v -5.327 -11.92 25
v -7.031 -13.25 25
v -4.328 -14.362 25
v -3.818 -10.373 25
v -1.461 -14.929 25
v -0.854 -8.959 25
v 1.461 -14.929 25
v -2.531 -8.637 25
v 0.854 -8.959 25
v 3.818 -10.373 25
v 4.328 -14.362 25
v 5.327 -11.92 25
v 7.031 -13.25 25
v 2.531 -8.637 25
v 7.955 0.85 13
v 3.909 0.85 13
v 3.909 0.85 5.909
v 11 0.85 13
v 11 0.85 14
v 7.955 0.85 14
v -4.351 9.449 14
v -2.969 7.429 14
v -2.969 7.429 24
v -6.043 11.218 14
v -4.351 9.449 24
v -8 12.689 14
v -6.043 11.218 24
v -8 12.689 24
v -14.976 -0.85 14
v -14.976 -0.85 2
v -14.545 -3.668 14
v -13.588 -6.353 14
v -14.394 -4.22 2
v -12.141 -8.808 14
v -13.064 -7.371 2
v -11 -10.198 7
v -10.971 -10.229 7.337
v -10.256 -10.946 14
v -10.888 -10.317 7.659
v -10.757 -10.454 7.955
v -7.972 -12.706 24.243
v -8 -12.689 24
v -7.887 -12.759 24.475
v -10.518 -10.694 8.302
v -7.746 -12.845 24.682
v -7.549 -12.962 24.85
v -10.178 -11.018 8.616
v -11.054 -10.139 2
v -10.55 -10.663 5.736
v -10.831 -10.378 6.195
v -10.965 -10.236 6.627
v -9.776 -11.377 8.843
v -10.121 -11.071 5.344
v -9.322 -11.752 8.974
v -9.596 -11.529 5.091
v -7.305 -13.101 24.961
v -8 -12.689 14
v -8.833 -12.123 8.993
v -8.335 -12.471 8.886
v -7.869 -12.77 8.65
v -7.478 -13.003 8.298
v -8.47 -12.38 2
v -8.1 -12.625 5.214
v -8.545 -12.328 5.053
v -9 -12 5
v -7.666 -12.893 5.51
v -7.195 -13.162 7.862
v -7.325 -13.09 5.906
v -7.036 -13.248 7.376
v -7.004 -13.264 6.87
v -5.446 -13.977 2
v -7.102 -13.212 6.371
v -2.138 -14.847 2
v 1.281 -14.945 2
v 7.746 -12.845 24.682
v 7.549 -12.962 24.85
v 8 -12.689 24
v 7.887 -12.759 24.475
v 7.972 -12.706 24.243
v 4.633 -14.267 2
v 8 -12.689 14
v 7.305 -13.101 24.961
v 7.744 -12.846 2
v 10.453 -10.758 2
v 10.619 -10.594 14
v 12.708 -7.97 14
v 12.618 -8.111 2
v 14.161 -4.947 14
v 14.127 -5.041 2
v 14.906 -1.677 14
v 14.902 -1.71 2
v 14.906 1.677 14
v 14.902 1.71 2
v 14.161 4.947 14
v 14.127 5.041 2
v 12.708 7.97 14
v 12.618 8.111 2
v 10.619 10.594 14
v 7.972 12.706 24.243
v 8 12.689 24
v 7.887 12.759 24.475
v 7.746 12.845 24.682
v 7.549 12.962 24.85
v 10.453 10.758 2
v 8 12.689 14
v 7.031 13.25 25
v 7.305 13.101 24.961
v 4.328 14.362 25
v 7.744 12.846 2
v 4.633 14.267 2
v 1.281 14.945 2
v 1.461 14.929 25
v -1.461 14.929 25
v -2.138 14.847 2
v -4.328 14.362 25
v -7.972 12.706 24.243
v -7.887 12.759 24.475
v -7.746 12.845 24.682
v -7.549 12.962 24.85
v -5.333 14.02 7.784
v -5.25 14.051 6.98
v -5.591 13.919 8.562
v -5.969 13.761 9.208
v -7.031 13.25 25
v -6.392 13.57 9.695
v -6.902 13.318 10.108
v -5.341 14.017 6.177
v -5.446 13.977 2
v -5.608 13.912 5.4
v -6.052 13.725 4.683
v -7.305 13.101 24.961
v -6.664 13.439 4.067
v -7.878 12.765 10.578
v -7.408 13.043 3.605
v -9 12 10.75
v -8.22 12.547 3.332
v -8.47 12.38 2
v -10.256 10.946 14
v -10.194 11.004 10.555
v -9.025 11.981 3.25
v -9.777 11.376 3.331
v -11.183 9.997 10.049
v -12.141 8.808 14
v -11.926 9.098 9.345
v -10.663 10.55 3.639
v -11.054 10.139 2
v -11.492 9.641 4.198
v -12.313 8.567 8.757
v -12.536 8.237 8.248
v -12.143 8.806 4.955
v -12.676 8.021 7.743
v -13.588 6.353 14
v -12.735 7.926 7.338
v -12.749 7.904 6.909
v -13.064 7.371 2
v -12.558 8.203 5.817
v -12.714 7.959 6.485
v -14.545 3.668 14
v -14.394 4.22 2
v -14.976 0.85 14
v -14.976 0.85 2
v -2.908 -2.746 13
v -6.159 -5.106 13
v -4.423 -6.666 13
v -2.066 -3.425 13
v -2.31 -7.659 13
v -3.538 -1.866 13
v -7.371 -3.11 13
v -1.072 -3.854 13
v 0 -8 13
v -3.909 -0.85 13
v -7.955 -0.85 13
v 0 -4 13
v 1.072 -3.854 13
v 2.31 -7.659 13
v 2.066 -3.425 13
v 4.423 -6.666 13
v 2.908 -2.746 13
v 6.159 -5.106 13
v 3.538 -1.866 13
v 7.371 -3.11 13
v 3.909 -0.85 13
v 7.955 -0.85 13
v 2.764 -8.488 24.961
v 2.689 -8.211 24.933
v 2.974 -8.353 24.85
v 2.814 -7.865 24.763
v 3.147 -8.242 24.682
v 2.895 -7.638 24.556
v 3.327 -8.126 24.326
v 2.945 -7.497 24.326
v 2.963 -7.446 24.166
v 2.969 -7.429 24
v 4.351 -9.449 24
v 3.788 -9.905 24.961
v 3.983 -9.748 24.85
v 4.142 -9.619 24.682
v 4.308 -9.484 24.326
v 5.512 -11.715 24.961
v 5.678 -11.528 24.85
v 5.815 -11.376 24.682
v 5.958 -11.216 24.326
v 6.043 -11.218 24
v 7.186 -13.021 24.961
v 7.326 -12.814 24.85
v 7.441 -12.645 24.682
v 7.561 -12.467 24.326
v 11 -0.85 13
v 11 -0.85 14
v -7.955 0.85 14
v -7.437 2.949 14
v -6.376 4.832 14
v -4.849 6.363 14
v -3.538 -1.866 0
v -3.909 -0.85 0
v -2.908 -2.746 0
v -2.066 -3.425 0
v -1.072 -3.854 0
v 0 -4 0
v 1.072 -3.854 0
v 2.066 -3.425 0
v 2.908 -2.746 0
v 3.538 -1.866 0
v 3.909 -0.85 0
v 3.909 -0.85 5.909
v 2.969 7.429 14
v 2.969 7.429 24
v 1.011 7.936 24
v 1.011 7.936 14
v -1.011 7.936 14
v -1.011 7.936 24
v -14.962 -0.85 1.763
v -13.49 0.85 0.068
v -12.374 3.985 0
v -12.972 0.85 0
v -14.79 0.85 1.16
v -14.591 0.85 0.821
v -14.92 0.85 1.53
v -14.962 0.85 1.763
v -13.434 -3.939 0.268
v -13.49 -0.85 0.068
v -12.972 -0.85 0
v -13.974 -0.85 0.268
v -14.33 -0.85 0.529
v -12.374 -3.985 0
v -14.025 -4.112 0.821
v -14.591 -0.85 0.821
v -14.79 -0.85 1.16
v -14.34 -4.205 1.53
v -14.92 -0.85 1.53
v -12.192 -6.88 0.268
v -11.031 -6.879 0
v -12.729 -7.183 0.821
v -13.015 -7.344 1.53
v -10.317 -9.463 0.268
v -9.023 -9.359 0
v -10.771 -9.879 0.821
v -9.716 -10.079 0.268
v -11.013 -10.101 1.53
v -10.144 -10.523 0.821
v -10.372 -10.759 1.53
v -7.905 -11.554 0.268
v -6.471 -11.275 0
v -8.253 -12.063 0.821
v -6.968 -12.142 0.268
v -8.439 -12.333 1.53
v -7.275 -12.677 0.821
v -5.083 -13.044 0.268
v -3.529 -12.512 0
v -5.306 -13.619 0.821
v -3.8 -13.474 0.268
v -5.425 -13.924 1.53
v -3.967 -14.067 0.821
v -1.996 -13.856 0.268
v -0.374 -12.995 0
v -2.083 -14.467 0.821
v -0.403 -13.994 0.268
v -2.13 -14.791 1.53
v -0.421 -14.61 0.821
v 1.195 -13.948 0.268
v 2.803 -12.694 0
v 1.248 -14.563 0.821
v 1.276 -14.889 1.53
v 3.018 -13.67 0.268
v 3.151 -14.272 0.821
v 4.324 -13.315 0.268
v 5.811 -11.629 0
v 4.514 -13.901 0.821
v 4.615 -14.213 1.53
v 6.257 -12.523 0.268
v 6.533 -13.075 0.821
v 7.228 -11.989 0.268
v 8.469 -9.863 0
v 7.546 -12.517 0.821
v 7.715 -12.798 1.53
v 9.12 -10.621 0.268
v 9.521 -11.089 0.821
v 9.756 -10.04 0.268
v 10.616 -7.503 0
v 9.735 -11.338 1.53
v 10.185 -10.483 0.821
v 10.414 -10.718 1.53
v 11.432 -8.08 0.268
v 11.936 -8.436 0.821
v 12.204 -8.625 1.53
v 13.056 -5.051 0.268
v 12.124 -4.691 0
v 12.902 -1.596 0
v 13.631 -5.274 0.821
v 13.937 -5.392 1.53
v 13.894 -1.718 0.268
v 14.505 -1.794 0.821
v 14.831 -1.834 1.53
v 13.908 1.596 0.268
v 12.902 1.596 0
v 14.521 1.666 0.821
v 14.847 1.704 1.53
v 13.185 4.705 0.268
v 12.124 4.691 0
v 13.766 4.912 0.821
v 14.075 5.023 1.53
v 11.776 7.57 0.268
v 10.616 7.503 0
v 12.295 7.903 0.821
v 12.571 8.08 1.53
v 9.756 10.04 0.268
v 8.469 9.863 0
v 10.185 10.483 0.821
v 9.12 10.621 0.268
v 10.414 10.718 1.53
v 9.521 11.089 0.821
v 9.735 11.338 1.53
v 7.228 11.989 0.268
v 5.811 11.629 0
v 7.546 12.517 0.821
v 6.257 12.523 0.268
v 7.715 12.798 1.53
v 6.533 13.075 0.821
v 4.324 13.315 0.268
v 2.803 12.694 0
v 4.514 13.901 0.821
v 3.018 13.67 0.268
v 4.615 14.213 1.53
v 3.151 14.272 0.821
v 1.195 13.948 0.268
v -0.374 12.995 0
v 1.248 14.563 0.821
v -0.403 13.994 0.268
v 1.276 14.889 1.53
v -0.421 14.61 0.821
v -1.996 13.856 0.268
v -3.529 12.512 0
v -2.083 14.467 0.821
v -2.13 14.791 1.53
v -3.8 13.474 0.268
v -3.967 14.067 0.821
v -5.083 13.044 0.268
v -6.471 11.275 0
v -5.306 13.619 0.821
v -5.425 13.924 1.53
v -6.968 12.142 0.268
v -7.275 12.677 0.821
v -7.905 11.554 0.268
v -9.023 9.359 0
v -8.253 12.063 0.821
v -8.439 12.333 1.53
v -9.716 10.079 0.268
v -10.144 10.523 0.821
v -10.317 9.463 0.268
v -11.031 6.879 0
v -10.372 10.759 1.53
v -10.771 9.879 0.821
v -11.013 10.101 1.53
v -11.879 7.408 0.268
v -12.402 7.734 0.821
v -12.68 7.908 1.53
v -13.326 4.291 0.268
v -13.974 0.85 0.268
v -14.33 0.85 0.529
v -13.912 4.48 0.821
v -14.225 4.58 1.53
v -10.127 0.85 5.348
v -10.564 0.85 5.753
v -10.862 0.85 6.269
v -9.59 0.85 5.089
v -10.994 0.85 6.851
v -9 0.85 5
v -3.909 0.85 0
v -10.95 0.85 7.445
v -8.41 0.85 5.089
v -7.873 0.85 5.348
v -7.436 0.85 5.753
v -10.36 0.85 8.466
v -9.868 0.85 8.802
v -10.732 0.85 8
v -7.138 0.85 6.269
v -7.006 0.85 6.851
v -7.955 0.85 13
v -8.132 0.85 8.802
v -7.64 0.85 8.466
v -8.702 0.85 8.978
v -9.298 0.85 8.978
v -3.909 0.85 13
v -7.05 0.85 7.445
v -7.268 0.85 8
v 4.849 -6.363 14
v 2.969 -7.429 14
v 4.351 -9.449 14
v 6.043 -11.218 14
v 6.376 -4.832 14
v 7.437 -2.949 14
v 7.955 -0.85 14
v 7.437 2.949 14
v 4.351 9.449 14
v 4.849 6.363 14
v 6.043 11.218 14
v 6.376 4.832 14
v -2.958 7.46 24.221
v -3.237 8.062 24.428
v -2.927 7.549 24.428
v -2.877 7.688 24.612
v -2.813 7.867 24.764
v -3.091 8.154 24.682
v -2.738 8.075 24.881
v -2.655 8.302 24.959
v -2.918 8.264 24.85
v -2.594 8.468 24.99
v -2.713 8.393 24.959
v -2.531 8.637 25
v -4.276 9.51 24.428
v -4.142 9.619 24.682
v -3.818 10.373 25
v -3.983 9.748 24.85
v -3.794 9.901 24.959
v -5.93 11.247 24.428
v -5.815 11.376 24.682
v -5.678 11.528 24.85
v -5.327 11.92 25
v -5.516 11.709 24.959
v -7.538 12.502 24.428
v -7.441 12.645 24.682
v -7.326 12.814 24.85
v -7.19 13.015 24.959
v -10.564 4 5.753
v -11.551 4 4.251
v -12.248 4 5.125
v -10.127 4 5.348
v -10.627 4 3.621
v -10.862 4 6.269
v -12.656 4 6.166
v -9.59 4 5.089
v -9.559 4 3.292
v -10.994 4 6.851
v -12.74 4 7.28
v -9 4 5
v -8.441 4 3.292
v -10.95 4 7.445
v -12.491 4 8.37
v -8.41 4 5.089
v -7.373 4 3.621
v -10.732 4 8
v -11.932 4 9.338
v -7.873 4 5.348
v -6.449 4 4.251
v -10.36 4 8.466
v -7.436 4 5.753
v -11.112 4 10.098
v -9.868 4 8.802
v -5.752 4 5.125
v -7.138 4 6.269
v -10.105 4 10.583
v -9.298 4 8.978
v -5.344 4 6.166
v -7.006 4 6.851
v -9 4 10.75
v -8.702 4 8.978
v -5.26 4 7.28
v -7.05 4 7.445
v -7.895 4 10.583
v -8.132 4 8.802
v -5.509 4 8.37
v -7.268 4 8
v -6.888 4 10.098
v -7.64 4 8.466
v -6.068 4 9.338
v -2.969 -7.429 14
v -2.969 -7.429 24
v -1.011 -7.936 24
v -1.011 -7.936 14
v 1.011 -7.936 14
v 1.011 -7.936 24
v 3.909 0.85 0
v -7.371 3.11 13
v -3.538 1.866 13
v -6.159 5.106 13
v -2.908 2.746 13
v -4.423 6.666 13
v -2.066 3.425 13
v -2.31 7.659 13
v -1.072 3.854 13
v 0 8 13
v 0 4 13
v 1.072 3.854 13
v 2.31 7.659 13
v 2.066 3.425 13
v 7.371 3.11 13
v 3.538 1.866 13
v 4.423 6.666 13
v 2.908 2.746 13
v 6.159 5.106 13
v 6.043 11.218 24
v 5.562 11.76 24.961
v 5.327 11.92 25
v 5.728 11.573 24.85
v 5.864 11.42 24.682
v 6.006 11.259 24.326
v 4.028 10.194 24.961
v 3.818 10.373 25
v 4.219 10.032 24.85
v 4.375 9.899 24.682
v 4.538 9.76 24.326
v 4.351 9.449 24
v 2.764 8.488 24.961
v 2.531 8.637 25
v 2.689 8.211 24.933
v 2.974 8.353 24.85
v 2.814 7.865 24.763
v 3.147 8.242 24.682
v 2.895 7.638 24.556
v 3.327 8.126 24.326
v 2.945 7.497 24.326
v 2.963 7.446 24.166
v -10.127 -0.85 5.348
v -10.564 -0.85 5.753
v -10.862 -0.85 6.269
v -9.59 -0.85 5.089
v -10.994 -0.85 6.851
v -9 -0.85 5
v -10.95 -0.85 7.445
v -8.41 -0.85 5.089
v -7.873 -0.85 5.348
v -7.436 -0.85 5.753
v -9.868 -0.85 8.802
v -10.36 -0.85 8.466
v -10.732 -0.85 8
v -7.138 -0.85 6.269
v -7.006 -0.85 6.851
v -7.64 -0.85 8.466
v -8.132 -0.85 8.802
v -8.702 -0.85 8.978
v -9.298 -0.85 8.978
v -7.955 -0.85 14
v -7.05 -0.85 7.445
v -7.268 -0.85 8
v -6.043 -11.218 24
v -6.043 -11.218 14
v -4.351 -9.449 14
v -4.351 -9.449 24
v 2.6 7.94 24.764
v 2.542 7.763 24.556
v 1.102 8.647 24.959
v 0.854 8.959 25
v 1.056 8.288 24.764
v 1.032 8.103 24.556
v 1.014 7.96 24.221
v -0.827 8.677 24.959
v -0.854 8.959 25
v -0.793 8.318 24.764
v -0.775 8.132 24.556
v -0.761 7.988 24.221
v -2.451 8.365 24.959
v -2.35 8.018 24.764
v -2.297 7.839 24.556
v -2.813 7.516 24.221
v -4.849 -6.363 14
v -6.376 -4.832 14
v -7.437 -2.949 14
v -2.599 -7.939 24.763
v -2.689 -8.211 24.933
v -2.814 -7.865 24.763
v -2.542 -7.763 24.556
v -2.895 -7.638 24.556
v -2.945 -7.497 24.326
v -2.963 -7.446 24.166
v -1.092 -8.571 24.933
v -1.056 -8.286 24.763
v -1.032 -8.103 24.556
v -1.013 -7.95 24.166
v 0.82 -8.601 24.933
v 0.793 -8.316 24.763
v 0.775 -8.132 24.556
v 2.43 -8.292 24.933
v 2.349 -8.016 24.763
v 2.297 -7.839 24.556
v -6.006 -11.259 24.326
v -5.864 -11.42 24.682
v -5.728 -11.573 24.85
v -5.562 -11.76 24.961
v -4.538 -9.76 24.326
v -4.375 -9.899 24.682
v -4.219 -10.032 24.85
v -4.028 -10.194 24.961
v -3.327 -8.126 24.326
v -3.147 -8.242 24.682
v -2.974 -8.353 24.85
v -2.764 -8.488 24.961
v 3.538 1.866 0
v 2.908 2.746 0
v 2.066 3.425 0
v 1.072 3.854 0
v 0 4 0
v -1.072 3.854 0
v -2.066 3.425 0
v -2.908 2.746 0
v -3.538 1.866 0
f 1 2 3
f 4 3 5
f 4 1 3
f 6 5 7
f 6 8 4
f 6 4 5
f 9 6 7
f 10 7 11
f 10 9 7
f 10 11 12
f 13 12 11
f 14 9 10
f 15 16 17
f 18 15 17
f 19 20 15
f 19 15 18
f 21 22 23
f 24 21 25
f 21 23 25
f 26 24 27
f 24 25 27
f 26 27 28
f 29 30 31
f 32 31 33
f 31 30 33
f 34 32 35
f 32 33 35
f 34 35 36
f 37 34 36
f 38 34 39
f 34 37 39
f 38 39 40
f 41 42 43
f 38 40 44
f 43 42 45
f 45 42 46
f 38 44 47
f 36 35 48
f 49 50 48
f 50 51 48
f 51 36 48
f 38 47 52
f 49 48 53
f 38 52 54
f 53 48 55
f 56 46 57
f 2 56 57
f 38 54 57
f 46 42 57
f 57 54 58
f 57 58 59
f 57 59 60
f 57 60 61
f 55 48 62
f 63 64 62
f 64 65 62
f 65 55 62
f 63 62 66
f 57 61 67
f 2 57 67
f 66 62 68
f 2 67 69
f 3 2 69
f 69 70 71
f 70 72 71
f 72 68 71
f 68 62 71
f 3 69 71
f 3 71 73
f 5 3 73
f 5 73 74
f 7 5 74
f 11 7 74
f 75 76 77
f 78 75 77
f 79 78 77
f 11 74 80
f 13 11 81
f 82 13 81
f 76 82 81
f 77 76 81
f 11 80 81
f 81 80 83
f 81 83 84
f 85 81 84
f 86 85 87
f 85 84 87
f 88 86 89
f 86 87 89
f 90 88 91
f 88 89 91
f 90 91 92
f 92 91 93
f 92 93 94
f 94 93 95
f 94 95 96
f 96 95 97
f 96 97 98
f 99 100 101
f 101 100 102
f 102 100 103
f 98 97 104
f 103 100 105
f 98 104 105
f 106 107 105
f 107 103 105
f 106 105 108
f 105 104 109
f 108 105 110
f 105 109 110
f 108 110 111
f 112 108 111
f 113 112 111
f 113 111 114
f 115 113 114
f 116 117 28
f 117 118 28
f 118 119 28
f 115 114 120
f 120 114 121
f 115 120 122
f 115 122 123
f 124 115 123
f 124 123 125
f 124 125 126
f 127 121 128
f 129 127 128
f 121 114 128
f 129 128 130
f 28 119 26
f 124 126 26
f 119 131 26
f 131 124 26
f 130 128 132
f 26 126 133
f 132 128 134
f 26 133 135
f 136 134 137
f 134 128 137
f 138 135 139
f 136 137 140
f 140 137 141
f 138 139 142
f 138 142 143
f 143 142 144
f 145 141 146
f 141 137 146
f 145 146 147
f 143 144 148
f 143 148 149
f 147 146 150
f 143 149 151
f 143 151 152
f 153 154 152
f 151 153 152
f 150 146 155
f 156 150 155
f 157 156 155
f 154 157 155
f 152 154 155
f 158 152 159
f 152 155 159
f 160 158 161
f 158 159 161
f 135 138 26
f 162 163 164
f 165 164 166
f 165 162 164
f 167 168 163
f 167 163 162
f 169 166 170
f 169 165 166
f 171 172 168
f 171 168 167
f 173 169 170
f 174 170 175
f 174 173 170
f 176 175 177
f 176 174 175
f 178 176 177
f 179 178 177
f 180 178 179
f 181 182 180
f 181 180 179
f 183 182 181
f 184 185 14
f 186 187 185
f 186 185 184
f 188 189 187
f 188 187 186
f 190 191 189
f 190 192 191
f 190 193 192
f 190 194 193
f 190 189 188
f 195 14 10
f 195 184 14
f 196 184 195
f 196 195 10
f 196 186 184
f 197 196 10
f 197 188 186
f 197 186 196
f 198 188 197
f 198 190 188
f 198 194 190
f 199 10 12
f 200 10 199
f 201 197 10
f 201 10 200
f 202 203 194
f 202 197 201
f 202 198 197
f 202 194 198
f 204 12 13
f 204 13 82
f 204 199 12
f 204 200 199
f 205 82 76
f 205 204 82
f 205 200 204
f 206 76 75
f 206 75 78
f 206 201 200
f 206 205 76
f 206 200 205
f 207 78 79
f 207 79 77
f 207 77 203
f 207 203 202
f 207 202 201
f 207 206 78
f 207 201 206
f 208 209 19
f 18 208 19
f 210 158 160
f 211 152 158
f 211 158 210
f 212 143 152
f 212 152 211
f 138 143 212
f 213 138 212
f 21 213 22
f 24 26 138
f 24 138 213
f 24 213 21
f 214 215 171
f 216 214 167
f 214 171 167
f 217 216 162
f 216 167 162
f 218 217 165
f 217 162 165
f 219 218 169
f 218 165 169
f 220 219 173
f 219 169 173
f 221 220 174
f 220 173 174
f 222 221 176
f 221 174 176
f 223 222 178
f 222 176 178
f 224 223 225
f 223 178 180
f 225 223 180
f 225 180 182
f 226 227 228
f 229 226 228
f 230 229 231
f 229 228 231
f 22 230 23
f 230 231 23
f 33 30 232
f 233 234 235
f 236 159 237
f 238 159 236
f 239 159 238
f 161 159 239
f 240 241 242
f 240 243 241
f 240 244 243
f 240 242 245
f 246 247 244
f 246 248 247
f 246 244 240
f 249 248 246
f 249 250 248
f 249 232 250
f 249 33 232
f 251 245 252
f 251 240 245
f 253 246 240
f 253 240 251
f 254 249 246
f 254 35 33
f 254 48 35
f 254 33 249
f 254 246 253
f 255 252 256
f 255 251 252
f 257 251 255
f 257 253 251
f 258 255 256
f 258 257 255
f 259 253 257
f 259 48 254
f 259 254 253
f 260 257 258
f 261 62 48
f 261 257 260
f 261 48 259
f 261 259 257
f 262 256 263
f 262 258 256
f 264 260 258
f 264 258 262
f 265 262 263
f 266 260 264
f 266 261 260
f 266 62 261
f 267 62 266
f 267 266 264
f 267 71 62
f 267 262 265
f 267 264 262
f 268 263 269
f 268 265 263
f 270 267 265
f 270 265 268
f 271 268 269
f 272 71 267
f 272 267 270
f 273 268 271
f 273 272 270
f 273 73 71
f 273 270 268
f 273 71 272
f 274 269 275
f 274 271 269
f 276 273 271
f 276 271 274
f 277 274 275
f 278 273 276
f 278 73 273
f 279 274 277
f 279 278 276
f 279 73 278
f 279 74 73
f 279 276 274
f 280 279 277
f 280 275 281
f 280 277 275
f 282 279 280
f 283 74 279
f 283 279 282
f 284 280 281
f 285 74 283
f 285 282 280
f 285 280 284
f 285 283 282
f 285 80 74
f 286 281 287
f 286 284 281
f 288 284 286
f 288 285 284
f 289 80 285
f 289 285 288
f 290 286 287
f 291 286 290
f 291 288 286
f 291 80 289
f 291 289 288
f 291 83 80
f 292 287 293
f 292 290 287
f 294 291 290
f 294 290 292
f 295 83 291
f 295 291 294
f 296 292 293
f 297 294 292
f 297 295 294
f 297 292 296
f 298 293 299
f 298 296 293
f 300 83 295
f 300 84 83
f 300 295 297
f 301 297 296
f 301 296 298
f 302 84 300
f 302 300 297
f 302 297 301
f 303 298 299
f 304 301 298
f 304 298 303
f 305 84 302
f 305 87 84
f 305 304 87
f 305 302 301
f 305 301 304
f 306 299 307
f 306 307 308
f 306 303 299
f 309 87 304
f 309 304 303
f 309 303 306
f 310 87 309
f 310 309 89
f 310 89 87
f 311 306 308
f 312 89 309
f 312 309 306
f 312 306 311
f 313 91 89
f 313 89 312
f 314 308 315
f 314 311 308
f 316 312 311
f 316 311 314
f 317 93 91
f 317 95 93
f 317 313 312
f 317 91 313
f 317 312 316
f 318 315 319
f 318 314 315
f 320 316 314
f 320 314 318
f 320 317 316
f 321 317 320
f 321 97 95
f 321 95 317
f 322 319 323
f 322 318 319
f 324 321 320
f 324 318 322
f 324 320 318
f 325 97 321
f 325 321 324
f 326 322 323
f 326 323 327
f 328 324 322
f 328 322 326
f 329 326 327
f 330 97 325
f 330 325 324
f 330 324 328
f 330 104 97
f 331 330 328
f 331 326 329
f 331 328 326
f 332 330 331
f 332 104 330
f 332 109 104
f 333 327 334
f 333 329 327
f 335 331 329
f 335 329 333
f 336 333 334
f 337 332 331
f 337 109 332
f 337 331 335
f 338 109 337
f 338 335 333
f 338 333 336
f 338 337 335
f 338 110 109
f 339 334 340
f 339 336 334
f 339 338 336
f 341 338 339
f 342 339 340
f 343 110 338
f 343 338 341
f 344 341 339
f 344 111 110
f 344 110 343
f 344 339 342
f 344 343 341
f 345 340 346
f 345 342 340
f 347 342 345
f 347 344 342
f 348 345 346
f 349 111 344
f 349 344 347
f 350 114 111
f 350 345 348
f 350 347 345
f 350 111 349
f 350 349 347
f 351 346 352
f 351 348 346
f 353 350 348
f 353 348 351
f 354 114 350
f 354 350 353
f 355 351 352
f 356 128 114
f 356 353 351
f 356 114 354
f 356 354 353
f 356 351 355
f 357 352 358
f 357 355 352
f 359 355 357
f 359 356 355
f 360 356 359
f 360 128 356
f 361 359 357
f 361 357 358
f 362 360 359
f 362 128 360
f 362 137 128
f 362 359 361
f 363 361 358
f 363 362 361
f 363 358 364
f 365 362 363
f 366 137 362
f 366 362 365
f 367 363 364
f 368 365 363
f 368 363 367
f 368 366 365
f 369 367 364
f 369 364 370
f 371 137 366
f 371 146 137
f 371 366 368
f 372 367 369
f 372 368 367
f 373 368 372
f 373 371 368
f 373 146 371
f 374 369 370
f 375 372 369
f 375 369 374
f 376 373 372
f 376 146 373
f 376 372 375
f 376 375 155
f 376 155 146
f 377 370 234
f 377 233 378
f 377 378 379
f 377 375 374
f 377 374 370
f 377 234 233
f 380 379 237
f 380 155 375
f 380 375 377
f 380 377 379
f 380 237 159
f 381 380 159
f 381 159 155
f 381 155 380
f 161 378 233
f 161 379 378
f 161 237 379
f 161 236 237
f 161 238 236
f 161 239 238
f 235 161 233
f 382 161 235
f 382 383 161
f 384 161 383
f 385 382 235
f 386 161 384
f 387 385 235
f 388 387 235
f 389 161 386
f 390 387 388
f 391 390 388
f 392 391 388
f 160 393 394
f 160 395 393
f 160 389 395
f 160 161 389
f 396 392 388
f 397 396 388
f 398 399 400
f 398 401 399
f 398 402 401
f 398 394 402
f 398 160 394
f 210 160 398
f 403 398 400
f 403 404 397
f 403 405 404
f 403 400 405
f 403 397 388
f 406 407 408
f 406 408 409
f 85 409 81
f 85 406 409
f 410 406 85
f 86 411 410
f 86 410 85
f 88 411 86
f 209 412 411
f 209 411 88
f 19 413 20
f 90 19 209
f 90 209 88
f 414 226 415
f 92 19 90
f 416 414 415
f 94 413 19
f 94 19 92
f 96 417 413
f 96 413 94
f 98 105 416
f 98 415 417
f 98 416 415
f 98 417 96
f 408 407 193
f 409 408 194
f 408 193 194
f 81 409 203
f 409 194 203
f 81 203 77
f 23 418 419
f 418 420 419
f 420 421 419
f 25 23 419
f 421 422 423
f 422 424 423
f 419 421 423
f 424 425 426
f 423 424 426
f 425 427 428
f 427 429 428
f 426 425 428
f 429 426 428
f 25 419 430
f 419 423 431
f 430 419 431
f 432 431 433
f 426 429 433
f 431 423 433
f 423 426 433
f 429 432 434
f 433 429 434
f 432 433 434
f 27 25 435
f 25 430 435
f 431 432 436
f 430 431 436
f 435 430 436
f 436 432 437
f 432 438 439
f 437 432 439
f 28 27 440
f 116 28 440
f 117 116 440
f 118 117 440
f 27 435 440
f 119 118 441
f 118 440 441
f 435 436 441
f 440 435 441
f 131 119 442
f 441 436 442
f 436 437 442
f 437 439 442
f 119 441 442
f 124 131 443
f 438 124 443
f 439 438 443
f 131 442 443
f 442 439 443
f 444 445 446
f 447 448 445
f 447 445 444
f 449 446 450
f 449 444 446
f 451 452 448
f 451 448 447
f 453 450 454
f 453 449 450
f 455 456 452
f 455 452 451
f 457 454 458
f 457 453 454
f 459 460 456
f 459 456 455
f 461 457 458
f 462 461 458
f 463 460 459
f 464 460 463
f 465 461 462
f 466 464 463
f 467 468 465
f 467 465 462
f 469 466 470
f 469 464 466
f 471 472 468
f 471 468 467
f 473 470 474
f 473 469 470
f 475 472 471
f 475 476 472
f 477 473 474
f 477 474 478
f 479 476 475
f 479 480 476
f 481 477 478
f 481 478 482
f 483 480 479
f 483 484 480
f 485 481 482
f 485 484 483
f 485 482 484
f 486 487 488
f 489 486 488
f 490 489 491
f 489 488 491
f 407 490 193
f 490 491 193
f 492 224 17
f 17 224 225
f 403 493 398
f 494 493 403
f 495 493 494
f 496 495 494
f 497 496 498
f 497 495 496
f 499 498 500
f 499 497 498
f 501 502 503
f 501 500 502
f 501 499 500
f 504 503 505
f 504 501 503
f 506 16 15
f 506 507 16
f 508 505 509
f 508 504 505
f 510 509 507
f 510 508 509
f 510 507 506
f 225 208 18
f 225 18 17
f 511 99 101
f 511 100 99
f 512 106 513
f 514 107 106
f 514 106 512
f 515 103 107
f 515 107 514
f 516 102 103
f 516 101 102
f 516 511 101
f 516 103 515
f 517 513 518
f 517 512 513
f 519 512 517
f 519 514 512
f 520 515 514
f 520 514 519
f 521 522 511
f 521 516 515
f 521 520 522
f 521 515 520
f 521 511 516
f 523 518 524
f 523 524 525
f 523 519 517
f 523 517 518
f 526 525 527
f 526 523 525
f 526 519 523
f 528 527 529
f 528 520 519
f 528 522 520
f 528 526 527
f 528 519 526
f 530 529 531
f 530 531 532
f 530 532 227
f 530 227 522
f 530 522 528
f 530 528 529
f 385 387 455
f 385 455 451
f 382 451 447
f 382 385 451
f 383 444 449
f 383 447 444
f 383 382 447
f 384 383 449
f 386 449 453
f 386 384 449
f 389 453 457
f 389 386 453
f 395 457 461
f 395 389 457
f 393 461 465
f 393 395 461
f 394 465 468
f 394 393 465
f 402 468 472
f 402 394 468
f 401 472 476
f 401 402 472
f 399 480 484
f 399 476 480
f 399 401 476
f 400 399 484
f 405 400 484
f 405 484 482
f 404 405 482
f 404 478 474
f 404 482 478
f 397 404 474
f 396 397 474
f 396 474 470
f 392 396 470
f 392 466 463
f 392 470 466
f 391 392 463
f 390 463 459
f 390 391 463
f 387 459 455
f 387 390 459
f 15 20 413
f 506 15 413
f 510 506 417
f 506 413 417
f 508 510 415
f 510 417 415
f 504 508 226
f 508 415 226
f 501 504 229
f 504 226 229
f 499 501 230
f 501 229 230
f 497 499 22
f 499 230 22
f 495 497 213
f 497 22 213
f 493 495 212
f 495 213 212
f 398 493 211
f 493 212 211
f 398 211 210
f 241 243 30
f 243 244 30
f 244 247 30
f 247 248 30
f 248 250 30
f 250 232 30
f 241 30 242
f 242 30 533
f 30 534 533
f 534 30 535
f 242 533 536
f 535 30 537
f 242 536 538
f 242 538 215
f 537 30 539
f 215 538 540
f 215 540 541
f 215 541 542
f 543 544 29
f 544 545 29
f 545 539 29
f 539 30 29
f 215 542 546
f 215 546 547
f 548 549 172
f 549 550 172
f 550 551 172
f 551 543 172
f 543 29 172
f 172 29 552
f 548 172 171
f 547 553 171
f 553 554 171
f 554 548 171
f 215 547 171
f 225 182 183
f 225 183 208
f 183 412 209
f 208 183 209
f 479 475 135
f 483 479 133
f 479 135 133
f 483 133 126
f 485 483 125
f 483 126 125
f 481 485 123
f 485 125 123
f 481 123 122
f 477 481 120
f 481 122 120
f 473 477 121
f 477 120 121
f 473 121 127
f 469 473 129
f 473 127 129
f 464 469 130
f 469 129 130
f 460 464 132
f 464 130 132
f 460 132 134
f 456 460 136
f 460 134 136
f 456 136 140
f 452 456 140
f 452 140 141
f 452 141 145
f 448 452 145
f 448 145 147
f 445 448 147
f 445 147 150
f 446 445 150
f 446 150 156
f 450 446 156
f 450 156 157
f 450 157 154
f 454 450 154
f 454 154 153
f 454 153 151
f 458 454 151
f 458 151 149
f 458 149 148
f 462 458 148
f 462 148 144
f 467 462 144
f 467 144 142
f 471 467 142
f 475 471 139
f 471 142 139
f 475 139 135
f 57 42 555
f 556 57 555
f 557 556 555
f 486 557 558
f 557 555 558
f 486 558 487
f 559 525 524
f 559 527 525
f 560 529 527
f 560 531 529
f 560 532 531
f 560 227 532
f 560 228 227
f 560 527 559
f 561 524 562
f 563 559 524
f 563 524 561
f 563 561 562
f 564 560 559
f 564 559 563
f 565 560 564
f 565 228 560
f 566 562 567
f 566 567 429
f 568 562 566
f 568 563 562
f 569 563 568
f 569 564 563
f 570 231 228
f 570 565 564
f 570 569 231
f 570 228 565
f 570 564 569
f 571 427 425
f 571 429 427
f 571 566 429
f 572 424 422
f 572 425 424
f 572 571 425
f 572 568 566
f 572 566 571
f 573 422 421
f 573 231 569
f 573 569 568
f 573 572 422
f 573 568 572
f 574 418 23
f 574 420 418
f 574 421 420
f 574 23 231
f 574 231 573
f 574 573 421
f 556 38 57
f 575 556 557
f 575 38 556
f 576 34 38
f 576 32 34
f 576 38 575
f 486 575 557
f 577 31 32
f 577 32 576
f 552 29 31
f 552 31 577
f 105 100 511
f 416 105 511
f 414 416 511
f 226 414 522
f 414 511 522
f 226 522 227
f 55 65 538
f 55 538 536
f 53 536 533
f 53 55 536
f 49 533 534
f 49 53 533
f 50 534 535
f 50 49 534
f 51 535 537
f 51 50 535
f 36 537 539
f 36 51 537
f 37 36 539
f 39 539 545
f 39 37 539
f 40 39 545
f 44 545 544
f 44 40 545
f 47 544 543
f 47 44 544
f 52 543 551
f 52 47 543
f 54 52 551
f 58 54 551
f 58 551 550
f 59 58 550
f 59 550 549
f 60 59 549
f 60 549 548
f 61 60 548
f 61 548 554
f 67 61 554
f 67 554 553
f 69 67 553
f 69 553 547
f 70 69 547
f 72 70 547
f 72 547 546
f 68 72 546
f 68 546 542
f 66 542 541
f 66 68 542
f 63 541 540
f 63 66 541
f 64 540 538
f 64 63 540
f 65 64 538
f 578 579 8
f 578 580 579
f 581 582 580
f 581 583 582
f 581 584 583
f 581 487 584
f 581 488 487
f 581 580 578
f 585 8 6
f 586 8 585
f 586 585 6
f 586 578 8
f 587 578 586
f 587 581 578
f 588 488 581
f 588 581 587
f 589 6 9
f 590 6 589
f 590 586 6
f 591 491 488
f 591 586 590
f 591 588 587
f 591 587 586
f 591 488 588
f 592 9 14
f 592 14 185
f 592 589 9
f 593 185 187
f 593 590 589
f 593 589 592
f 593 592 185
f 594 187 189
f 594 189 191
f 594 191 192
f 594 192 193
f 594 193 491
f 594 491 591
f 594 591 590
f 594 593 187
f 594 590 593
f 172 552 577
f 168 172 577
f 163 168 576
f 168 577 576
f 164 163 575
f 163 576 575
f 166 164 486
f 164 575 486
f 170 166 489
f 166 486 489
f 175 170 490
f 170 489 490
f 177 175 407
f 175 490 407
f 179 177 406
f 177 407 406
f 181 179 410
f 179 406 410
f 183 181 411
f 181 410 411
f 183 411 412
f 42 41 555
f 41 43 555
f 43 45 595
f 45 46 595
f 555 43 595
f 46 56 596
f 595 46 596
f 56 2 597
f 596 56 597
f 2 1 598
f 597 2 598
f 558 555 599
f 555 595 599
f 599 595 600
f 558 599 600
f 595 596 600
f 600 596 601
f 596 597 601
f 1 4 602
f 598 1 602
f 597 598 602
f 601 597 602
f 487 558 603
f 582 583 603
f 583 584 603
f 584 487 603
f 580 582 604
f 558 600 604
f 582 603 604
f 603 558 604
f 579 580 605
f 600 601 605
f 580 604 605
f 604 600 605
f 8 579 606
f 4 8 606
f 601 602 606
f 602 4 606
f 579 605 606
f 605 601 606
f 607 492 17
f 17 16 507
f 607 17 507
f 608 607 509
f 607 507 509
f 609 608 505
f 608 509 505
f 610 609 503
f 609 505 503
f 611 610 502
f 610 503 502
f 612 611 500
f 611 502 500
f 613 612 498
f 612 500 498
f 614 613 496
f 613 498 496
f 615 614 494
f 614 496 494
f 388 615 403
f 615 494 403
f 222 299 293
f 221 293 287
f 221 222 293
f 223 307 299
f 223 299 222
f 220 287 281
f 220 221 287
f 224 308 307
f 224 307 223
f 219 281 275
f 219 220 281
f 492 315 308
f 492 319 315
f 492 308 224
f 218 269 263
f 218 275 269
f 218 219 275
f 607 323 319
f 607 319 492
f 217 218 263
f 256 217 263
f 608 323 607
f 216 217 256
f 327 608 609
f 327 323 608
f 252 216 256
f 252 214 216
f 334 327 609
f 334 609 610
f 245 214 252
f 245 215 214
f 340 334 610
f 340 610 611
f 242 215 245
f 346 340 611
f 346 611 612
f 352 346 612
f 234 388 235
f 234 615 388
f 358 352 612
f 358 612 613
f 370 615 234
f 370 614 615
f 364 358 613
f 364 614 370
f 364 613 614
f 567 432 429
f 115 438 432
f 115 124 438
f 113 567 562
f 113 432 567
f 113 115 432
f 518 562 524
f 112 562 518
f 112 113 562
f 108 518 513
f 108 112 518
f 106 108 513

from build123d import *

# Parameters (mm, degrees)
SKETCH1_R               = 15
BOSS_EXTRUDE1_DEPTH     = 25
CUT_EXTRUDE1_DEPTH      = 11
SKETCH4_R               = 4
CUT_EXTRUDE2_DEPTH      = 14
SKETCH5_R               = 8
CUT_EXTRUDE3_DEPTH      = 1
SKETCH6_W               = 28.841933153
SKETCH6_H               = 1.7
CUT_EXTRUDE4_DEPTH      = 14
SKETCH7_W               = 7.091355734
SKETCH7_H               = 1.7
BOSS_EXTRUDE2_DEPTH     = 2
CHAMFER1_SIZE           = 11
CUT_EXTRUDE5_DEPTH      = 14
CUT_EXTRUDE5_DEPTH_BACK = 14
SKETCH8_R               = 2
SKETCH9_R               = 3.75
CUT_EXTRUDE6_DEPTH      = 11
FILLET1_R               = 2
FILLET2_R               = 1


with BuildPart() as part:
    # Sketch1 → Boss-Extrude1 (new body)
    with BuildSketch(Plane.XY):
        Circle(SKETCH1_R)
    extrude(amount=BOSS_EXTRUDE1_DEPTH)

    # Sketch3 → Cut-Extrude1 (cut)
    with BuildSketch(Plane.XY.offset(25)):
        with BuildLine():
            ThreePointArc((2.96875, -7.428763251), (31, 0), (2.96875, 7.428763251))
            ThreePointArc((2.96875, 7.428763251), (0, 8), (-2.96875, 7.428763251))
            ThreePointArc((-2.96875, 7.428763251), (-31, 0), (-2.96875, -7.428763251))
            ThreePointArc((-2.96875, -7.428763251), (0, -8), (2.96875, -7.428763251))
        make_face()
    extrude(amount=-CUT_EXTRUDE1_DEPTH, mode=Mode.SUBTRACT)

    # Sketch4 → Cut-Extrude2 (cut)
    with BuildSketch(Plane.XY.offset(14)):
        Circle(SKETCH4_R)
    extrude(amount=-CUT_EXTRUDE2_DEPTH, mode=Mode.SUBTRACT)

    # Sketch5 → Cut-Extrude3 (cut)
    with BuildSketch(Plane.XY.offset(14)):
        Circle(SKETCH5_R)
    extrude(amount=-CUT_EXTRUDE3_DEPTH, mode=Mode.SUBTRACT)

    # Sketch6 → Cut-Extrude4 (cut)
    with BuildSketch(Plane.XY.offset(14)):
        with Locations((-3.420966576, 0)):
            Rectangle(SKETCH6_W, SKETCH6_H)
    extrude(amount=-CUT_EXTRUDE4_DEPTH, mode=Mode.SUBTRACT)

    # Sketch7 → Boss-Extrude2 (add)
    with BuildSketch(Plane(origin=(0, 0, 0), x_dir=(-1, 0, 0), z_dir=(0, 0, -1))):
        with Locations((-7.454322133, 0)):
            Rectangle(SKETCH7_W, SKETCH7_H)
    extrude(amount=-BOSS_EXTRUDE2_DEPTH)

    # Chamfer1
    # the kernel refuses this chamfer: 11 mm, written as the material it adds along each edge
    with BuildSketch(Plane(origin=(11, -0.85, 2), x_dir=(0.027495876610586414, 0, 0.9996219169112968), z_dir=(0, 1, 0))) as chamfer1_piece_1_section:
        Polygon((CHAMFER1_SIZE * 0.999621916911, -CHAMFER1_SIZE * 0.0274958766106), (-CHAMFER1_SIZE * 0.0274958766106, -CHAMFER1_SIZE * 0.999621916911), (0, 0), align=None)
    chamfer1_piece_1 = extrude(amount=1.7, mode=Mode.PRIVATE)
    chamfer1_piece_1 = split(chamfer1_piece_1, bisect_by=Plane(origin=(3.908644266, 0, 6.042844173), z_dir=(1, 0, 0)), keep=Keep.TOP, mode=Mode.PRIVATE)
    add(chamfer1_piece_1)

    # Sketch8 → Cut-Extrude5 (cut, two sides: drawn at the far end of the back side and taken through both)
    with BuildSketch(Plane(origin=(0, 0, 0), x_dir=(1, 0, 0), z_dir=(0, 1, 0)).offset(-CUT_EXTRUDE5_DEPTH_BACK)):
        with Locations(Location((-9, -7, 0), (0, 0, 90))):
            Circle(SKETCH8_R)
    extrude(amount=CUT_EXTRUDE5_DEPTH + CUT_EXTRUDE5_DEPTH_BACK, mode=Mode.SUBTRACT)

    # Sketch9 → Cut-Extrude6 (cut)
    with BuildSketch(Plane(origin=(0, 15, 0), x_dir=(1, 0, 0), z_dir=(0, 1, 0))):
        with Locations(Location((-9, -7, 0), (0, 0, 270))):
            Circle(SKETCH9_R)
    extrude(amount=-CUT_EXTRUDE6_DEPTH, mode=Mode.SUBTRACT)

    # Fillet1
    fillet1_edges = [part.edges().sort_by_distance(p)[0] for p in [
        (15, 0, 0),
    ]]
    fillet(fillet1_edges, radius=FILLET1_R)

    # Fillet2
    fillet2_edges = [part.edges().sort_by_distance(p)[0] for p in [
        (-5.160499055, 10.368472369, 25),
        (0, -8, 25),
        (5.160499055, -10.368472369, 25),
        (0, 8, 25),
        (-5.160499055, -10.368472369, 25),
        (5.160499055, 10.368472369, 25),
    ]]
    fillet(fillet2_edges, radius=FILLET2_R)


solid = part.part
